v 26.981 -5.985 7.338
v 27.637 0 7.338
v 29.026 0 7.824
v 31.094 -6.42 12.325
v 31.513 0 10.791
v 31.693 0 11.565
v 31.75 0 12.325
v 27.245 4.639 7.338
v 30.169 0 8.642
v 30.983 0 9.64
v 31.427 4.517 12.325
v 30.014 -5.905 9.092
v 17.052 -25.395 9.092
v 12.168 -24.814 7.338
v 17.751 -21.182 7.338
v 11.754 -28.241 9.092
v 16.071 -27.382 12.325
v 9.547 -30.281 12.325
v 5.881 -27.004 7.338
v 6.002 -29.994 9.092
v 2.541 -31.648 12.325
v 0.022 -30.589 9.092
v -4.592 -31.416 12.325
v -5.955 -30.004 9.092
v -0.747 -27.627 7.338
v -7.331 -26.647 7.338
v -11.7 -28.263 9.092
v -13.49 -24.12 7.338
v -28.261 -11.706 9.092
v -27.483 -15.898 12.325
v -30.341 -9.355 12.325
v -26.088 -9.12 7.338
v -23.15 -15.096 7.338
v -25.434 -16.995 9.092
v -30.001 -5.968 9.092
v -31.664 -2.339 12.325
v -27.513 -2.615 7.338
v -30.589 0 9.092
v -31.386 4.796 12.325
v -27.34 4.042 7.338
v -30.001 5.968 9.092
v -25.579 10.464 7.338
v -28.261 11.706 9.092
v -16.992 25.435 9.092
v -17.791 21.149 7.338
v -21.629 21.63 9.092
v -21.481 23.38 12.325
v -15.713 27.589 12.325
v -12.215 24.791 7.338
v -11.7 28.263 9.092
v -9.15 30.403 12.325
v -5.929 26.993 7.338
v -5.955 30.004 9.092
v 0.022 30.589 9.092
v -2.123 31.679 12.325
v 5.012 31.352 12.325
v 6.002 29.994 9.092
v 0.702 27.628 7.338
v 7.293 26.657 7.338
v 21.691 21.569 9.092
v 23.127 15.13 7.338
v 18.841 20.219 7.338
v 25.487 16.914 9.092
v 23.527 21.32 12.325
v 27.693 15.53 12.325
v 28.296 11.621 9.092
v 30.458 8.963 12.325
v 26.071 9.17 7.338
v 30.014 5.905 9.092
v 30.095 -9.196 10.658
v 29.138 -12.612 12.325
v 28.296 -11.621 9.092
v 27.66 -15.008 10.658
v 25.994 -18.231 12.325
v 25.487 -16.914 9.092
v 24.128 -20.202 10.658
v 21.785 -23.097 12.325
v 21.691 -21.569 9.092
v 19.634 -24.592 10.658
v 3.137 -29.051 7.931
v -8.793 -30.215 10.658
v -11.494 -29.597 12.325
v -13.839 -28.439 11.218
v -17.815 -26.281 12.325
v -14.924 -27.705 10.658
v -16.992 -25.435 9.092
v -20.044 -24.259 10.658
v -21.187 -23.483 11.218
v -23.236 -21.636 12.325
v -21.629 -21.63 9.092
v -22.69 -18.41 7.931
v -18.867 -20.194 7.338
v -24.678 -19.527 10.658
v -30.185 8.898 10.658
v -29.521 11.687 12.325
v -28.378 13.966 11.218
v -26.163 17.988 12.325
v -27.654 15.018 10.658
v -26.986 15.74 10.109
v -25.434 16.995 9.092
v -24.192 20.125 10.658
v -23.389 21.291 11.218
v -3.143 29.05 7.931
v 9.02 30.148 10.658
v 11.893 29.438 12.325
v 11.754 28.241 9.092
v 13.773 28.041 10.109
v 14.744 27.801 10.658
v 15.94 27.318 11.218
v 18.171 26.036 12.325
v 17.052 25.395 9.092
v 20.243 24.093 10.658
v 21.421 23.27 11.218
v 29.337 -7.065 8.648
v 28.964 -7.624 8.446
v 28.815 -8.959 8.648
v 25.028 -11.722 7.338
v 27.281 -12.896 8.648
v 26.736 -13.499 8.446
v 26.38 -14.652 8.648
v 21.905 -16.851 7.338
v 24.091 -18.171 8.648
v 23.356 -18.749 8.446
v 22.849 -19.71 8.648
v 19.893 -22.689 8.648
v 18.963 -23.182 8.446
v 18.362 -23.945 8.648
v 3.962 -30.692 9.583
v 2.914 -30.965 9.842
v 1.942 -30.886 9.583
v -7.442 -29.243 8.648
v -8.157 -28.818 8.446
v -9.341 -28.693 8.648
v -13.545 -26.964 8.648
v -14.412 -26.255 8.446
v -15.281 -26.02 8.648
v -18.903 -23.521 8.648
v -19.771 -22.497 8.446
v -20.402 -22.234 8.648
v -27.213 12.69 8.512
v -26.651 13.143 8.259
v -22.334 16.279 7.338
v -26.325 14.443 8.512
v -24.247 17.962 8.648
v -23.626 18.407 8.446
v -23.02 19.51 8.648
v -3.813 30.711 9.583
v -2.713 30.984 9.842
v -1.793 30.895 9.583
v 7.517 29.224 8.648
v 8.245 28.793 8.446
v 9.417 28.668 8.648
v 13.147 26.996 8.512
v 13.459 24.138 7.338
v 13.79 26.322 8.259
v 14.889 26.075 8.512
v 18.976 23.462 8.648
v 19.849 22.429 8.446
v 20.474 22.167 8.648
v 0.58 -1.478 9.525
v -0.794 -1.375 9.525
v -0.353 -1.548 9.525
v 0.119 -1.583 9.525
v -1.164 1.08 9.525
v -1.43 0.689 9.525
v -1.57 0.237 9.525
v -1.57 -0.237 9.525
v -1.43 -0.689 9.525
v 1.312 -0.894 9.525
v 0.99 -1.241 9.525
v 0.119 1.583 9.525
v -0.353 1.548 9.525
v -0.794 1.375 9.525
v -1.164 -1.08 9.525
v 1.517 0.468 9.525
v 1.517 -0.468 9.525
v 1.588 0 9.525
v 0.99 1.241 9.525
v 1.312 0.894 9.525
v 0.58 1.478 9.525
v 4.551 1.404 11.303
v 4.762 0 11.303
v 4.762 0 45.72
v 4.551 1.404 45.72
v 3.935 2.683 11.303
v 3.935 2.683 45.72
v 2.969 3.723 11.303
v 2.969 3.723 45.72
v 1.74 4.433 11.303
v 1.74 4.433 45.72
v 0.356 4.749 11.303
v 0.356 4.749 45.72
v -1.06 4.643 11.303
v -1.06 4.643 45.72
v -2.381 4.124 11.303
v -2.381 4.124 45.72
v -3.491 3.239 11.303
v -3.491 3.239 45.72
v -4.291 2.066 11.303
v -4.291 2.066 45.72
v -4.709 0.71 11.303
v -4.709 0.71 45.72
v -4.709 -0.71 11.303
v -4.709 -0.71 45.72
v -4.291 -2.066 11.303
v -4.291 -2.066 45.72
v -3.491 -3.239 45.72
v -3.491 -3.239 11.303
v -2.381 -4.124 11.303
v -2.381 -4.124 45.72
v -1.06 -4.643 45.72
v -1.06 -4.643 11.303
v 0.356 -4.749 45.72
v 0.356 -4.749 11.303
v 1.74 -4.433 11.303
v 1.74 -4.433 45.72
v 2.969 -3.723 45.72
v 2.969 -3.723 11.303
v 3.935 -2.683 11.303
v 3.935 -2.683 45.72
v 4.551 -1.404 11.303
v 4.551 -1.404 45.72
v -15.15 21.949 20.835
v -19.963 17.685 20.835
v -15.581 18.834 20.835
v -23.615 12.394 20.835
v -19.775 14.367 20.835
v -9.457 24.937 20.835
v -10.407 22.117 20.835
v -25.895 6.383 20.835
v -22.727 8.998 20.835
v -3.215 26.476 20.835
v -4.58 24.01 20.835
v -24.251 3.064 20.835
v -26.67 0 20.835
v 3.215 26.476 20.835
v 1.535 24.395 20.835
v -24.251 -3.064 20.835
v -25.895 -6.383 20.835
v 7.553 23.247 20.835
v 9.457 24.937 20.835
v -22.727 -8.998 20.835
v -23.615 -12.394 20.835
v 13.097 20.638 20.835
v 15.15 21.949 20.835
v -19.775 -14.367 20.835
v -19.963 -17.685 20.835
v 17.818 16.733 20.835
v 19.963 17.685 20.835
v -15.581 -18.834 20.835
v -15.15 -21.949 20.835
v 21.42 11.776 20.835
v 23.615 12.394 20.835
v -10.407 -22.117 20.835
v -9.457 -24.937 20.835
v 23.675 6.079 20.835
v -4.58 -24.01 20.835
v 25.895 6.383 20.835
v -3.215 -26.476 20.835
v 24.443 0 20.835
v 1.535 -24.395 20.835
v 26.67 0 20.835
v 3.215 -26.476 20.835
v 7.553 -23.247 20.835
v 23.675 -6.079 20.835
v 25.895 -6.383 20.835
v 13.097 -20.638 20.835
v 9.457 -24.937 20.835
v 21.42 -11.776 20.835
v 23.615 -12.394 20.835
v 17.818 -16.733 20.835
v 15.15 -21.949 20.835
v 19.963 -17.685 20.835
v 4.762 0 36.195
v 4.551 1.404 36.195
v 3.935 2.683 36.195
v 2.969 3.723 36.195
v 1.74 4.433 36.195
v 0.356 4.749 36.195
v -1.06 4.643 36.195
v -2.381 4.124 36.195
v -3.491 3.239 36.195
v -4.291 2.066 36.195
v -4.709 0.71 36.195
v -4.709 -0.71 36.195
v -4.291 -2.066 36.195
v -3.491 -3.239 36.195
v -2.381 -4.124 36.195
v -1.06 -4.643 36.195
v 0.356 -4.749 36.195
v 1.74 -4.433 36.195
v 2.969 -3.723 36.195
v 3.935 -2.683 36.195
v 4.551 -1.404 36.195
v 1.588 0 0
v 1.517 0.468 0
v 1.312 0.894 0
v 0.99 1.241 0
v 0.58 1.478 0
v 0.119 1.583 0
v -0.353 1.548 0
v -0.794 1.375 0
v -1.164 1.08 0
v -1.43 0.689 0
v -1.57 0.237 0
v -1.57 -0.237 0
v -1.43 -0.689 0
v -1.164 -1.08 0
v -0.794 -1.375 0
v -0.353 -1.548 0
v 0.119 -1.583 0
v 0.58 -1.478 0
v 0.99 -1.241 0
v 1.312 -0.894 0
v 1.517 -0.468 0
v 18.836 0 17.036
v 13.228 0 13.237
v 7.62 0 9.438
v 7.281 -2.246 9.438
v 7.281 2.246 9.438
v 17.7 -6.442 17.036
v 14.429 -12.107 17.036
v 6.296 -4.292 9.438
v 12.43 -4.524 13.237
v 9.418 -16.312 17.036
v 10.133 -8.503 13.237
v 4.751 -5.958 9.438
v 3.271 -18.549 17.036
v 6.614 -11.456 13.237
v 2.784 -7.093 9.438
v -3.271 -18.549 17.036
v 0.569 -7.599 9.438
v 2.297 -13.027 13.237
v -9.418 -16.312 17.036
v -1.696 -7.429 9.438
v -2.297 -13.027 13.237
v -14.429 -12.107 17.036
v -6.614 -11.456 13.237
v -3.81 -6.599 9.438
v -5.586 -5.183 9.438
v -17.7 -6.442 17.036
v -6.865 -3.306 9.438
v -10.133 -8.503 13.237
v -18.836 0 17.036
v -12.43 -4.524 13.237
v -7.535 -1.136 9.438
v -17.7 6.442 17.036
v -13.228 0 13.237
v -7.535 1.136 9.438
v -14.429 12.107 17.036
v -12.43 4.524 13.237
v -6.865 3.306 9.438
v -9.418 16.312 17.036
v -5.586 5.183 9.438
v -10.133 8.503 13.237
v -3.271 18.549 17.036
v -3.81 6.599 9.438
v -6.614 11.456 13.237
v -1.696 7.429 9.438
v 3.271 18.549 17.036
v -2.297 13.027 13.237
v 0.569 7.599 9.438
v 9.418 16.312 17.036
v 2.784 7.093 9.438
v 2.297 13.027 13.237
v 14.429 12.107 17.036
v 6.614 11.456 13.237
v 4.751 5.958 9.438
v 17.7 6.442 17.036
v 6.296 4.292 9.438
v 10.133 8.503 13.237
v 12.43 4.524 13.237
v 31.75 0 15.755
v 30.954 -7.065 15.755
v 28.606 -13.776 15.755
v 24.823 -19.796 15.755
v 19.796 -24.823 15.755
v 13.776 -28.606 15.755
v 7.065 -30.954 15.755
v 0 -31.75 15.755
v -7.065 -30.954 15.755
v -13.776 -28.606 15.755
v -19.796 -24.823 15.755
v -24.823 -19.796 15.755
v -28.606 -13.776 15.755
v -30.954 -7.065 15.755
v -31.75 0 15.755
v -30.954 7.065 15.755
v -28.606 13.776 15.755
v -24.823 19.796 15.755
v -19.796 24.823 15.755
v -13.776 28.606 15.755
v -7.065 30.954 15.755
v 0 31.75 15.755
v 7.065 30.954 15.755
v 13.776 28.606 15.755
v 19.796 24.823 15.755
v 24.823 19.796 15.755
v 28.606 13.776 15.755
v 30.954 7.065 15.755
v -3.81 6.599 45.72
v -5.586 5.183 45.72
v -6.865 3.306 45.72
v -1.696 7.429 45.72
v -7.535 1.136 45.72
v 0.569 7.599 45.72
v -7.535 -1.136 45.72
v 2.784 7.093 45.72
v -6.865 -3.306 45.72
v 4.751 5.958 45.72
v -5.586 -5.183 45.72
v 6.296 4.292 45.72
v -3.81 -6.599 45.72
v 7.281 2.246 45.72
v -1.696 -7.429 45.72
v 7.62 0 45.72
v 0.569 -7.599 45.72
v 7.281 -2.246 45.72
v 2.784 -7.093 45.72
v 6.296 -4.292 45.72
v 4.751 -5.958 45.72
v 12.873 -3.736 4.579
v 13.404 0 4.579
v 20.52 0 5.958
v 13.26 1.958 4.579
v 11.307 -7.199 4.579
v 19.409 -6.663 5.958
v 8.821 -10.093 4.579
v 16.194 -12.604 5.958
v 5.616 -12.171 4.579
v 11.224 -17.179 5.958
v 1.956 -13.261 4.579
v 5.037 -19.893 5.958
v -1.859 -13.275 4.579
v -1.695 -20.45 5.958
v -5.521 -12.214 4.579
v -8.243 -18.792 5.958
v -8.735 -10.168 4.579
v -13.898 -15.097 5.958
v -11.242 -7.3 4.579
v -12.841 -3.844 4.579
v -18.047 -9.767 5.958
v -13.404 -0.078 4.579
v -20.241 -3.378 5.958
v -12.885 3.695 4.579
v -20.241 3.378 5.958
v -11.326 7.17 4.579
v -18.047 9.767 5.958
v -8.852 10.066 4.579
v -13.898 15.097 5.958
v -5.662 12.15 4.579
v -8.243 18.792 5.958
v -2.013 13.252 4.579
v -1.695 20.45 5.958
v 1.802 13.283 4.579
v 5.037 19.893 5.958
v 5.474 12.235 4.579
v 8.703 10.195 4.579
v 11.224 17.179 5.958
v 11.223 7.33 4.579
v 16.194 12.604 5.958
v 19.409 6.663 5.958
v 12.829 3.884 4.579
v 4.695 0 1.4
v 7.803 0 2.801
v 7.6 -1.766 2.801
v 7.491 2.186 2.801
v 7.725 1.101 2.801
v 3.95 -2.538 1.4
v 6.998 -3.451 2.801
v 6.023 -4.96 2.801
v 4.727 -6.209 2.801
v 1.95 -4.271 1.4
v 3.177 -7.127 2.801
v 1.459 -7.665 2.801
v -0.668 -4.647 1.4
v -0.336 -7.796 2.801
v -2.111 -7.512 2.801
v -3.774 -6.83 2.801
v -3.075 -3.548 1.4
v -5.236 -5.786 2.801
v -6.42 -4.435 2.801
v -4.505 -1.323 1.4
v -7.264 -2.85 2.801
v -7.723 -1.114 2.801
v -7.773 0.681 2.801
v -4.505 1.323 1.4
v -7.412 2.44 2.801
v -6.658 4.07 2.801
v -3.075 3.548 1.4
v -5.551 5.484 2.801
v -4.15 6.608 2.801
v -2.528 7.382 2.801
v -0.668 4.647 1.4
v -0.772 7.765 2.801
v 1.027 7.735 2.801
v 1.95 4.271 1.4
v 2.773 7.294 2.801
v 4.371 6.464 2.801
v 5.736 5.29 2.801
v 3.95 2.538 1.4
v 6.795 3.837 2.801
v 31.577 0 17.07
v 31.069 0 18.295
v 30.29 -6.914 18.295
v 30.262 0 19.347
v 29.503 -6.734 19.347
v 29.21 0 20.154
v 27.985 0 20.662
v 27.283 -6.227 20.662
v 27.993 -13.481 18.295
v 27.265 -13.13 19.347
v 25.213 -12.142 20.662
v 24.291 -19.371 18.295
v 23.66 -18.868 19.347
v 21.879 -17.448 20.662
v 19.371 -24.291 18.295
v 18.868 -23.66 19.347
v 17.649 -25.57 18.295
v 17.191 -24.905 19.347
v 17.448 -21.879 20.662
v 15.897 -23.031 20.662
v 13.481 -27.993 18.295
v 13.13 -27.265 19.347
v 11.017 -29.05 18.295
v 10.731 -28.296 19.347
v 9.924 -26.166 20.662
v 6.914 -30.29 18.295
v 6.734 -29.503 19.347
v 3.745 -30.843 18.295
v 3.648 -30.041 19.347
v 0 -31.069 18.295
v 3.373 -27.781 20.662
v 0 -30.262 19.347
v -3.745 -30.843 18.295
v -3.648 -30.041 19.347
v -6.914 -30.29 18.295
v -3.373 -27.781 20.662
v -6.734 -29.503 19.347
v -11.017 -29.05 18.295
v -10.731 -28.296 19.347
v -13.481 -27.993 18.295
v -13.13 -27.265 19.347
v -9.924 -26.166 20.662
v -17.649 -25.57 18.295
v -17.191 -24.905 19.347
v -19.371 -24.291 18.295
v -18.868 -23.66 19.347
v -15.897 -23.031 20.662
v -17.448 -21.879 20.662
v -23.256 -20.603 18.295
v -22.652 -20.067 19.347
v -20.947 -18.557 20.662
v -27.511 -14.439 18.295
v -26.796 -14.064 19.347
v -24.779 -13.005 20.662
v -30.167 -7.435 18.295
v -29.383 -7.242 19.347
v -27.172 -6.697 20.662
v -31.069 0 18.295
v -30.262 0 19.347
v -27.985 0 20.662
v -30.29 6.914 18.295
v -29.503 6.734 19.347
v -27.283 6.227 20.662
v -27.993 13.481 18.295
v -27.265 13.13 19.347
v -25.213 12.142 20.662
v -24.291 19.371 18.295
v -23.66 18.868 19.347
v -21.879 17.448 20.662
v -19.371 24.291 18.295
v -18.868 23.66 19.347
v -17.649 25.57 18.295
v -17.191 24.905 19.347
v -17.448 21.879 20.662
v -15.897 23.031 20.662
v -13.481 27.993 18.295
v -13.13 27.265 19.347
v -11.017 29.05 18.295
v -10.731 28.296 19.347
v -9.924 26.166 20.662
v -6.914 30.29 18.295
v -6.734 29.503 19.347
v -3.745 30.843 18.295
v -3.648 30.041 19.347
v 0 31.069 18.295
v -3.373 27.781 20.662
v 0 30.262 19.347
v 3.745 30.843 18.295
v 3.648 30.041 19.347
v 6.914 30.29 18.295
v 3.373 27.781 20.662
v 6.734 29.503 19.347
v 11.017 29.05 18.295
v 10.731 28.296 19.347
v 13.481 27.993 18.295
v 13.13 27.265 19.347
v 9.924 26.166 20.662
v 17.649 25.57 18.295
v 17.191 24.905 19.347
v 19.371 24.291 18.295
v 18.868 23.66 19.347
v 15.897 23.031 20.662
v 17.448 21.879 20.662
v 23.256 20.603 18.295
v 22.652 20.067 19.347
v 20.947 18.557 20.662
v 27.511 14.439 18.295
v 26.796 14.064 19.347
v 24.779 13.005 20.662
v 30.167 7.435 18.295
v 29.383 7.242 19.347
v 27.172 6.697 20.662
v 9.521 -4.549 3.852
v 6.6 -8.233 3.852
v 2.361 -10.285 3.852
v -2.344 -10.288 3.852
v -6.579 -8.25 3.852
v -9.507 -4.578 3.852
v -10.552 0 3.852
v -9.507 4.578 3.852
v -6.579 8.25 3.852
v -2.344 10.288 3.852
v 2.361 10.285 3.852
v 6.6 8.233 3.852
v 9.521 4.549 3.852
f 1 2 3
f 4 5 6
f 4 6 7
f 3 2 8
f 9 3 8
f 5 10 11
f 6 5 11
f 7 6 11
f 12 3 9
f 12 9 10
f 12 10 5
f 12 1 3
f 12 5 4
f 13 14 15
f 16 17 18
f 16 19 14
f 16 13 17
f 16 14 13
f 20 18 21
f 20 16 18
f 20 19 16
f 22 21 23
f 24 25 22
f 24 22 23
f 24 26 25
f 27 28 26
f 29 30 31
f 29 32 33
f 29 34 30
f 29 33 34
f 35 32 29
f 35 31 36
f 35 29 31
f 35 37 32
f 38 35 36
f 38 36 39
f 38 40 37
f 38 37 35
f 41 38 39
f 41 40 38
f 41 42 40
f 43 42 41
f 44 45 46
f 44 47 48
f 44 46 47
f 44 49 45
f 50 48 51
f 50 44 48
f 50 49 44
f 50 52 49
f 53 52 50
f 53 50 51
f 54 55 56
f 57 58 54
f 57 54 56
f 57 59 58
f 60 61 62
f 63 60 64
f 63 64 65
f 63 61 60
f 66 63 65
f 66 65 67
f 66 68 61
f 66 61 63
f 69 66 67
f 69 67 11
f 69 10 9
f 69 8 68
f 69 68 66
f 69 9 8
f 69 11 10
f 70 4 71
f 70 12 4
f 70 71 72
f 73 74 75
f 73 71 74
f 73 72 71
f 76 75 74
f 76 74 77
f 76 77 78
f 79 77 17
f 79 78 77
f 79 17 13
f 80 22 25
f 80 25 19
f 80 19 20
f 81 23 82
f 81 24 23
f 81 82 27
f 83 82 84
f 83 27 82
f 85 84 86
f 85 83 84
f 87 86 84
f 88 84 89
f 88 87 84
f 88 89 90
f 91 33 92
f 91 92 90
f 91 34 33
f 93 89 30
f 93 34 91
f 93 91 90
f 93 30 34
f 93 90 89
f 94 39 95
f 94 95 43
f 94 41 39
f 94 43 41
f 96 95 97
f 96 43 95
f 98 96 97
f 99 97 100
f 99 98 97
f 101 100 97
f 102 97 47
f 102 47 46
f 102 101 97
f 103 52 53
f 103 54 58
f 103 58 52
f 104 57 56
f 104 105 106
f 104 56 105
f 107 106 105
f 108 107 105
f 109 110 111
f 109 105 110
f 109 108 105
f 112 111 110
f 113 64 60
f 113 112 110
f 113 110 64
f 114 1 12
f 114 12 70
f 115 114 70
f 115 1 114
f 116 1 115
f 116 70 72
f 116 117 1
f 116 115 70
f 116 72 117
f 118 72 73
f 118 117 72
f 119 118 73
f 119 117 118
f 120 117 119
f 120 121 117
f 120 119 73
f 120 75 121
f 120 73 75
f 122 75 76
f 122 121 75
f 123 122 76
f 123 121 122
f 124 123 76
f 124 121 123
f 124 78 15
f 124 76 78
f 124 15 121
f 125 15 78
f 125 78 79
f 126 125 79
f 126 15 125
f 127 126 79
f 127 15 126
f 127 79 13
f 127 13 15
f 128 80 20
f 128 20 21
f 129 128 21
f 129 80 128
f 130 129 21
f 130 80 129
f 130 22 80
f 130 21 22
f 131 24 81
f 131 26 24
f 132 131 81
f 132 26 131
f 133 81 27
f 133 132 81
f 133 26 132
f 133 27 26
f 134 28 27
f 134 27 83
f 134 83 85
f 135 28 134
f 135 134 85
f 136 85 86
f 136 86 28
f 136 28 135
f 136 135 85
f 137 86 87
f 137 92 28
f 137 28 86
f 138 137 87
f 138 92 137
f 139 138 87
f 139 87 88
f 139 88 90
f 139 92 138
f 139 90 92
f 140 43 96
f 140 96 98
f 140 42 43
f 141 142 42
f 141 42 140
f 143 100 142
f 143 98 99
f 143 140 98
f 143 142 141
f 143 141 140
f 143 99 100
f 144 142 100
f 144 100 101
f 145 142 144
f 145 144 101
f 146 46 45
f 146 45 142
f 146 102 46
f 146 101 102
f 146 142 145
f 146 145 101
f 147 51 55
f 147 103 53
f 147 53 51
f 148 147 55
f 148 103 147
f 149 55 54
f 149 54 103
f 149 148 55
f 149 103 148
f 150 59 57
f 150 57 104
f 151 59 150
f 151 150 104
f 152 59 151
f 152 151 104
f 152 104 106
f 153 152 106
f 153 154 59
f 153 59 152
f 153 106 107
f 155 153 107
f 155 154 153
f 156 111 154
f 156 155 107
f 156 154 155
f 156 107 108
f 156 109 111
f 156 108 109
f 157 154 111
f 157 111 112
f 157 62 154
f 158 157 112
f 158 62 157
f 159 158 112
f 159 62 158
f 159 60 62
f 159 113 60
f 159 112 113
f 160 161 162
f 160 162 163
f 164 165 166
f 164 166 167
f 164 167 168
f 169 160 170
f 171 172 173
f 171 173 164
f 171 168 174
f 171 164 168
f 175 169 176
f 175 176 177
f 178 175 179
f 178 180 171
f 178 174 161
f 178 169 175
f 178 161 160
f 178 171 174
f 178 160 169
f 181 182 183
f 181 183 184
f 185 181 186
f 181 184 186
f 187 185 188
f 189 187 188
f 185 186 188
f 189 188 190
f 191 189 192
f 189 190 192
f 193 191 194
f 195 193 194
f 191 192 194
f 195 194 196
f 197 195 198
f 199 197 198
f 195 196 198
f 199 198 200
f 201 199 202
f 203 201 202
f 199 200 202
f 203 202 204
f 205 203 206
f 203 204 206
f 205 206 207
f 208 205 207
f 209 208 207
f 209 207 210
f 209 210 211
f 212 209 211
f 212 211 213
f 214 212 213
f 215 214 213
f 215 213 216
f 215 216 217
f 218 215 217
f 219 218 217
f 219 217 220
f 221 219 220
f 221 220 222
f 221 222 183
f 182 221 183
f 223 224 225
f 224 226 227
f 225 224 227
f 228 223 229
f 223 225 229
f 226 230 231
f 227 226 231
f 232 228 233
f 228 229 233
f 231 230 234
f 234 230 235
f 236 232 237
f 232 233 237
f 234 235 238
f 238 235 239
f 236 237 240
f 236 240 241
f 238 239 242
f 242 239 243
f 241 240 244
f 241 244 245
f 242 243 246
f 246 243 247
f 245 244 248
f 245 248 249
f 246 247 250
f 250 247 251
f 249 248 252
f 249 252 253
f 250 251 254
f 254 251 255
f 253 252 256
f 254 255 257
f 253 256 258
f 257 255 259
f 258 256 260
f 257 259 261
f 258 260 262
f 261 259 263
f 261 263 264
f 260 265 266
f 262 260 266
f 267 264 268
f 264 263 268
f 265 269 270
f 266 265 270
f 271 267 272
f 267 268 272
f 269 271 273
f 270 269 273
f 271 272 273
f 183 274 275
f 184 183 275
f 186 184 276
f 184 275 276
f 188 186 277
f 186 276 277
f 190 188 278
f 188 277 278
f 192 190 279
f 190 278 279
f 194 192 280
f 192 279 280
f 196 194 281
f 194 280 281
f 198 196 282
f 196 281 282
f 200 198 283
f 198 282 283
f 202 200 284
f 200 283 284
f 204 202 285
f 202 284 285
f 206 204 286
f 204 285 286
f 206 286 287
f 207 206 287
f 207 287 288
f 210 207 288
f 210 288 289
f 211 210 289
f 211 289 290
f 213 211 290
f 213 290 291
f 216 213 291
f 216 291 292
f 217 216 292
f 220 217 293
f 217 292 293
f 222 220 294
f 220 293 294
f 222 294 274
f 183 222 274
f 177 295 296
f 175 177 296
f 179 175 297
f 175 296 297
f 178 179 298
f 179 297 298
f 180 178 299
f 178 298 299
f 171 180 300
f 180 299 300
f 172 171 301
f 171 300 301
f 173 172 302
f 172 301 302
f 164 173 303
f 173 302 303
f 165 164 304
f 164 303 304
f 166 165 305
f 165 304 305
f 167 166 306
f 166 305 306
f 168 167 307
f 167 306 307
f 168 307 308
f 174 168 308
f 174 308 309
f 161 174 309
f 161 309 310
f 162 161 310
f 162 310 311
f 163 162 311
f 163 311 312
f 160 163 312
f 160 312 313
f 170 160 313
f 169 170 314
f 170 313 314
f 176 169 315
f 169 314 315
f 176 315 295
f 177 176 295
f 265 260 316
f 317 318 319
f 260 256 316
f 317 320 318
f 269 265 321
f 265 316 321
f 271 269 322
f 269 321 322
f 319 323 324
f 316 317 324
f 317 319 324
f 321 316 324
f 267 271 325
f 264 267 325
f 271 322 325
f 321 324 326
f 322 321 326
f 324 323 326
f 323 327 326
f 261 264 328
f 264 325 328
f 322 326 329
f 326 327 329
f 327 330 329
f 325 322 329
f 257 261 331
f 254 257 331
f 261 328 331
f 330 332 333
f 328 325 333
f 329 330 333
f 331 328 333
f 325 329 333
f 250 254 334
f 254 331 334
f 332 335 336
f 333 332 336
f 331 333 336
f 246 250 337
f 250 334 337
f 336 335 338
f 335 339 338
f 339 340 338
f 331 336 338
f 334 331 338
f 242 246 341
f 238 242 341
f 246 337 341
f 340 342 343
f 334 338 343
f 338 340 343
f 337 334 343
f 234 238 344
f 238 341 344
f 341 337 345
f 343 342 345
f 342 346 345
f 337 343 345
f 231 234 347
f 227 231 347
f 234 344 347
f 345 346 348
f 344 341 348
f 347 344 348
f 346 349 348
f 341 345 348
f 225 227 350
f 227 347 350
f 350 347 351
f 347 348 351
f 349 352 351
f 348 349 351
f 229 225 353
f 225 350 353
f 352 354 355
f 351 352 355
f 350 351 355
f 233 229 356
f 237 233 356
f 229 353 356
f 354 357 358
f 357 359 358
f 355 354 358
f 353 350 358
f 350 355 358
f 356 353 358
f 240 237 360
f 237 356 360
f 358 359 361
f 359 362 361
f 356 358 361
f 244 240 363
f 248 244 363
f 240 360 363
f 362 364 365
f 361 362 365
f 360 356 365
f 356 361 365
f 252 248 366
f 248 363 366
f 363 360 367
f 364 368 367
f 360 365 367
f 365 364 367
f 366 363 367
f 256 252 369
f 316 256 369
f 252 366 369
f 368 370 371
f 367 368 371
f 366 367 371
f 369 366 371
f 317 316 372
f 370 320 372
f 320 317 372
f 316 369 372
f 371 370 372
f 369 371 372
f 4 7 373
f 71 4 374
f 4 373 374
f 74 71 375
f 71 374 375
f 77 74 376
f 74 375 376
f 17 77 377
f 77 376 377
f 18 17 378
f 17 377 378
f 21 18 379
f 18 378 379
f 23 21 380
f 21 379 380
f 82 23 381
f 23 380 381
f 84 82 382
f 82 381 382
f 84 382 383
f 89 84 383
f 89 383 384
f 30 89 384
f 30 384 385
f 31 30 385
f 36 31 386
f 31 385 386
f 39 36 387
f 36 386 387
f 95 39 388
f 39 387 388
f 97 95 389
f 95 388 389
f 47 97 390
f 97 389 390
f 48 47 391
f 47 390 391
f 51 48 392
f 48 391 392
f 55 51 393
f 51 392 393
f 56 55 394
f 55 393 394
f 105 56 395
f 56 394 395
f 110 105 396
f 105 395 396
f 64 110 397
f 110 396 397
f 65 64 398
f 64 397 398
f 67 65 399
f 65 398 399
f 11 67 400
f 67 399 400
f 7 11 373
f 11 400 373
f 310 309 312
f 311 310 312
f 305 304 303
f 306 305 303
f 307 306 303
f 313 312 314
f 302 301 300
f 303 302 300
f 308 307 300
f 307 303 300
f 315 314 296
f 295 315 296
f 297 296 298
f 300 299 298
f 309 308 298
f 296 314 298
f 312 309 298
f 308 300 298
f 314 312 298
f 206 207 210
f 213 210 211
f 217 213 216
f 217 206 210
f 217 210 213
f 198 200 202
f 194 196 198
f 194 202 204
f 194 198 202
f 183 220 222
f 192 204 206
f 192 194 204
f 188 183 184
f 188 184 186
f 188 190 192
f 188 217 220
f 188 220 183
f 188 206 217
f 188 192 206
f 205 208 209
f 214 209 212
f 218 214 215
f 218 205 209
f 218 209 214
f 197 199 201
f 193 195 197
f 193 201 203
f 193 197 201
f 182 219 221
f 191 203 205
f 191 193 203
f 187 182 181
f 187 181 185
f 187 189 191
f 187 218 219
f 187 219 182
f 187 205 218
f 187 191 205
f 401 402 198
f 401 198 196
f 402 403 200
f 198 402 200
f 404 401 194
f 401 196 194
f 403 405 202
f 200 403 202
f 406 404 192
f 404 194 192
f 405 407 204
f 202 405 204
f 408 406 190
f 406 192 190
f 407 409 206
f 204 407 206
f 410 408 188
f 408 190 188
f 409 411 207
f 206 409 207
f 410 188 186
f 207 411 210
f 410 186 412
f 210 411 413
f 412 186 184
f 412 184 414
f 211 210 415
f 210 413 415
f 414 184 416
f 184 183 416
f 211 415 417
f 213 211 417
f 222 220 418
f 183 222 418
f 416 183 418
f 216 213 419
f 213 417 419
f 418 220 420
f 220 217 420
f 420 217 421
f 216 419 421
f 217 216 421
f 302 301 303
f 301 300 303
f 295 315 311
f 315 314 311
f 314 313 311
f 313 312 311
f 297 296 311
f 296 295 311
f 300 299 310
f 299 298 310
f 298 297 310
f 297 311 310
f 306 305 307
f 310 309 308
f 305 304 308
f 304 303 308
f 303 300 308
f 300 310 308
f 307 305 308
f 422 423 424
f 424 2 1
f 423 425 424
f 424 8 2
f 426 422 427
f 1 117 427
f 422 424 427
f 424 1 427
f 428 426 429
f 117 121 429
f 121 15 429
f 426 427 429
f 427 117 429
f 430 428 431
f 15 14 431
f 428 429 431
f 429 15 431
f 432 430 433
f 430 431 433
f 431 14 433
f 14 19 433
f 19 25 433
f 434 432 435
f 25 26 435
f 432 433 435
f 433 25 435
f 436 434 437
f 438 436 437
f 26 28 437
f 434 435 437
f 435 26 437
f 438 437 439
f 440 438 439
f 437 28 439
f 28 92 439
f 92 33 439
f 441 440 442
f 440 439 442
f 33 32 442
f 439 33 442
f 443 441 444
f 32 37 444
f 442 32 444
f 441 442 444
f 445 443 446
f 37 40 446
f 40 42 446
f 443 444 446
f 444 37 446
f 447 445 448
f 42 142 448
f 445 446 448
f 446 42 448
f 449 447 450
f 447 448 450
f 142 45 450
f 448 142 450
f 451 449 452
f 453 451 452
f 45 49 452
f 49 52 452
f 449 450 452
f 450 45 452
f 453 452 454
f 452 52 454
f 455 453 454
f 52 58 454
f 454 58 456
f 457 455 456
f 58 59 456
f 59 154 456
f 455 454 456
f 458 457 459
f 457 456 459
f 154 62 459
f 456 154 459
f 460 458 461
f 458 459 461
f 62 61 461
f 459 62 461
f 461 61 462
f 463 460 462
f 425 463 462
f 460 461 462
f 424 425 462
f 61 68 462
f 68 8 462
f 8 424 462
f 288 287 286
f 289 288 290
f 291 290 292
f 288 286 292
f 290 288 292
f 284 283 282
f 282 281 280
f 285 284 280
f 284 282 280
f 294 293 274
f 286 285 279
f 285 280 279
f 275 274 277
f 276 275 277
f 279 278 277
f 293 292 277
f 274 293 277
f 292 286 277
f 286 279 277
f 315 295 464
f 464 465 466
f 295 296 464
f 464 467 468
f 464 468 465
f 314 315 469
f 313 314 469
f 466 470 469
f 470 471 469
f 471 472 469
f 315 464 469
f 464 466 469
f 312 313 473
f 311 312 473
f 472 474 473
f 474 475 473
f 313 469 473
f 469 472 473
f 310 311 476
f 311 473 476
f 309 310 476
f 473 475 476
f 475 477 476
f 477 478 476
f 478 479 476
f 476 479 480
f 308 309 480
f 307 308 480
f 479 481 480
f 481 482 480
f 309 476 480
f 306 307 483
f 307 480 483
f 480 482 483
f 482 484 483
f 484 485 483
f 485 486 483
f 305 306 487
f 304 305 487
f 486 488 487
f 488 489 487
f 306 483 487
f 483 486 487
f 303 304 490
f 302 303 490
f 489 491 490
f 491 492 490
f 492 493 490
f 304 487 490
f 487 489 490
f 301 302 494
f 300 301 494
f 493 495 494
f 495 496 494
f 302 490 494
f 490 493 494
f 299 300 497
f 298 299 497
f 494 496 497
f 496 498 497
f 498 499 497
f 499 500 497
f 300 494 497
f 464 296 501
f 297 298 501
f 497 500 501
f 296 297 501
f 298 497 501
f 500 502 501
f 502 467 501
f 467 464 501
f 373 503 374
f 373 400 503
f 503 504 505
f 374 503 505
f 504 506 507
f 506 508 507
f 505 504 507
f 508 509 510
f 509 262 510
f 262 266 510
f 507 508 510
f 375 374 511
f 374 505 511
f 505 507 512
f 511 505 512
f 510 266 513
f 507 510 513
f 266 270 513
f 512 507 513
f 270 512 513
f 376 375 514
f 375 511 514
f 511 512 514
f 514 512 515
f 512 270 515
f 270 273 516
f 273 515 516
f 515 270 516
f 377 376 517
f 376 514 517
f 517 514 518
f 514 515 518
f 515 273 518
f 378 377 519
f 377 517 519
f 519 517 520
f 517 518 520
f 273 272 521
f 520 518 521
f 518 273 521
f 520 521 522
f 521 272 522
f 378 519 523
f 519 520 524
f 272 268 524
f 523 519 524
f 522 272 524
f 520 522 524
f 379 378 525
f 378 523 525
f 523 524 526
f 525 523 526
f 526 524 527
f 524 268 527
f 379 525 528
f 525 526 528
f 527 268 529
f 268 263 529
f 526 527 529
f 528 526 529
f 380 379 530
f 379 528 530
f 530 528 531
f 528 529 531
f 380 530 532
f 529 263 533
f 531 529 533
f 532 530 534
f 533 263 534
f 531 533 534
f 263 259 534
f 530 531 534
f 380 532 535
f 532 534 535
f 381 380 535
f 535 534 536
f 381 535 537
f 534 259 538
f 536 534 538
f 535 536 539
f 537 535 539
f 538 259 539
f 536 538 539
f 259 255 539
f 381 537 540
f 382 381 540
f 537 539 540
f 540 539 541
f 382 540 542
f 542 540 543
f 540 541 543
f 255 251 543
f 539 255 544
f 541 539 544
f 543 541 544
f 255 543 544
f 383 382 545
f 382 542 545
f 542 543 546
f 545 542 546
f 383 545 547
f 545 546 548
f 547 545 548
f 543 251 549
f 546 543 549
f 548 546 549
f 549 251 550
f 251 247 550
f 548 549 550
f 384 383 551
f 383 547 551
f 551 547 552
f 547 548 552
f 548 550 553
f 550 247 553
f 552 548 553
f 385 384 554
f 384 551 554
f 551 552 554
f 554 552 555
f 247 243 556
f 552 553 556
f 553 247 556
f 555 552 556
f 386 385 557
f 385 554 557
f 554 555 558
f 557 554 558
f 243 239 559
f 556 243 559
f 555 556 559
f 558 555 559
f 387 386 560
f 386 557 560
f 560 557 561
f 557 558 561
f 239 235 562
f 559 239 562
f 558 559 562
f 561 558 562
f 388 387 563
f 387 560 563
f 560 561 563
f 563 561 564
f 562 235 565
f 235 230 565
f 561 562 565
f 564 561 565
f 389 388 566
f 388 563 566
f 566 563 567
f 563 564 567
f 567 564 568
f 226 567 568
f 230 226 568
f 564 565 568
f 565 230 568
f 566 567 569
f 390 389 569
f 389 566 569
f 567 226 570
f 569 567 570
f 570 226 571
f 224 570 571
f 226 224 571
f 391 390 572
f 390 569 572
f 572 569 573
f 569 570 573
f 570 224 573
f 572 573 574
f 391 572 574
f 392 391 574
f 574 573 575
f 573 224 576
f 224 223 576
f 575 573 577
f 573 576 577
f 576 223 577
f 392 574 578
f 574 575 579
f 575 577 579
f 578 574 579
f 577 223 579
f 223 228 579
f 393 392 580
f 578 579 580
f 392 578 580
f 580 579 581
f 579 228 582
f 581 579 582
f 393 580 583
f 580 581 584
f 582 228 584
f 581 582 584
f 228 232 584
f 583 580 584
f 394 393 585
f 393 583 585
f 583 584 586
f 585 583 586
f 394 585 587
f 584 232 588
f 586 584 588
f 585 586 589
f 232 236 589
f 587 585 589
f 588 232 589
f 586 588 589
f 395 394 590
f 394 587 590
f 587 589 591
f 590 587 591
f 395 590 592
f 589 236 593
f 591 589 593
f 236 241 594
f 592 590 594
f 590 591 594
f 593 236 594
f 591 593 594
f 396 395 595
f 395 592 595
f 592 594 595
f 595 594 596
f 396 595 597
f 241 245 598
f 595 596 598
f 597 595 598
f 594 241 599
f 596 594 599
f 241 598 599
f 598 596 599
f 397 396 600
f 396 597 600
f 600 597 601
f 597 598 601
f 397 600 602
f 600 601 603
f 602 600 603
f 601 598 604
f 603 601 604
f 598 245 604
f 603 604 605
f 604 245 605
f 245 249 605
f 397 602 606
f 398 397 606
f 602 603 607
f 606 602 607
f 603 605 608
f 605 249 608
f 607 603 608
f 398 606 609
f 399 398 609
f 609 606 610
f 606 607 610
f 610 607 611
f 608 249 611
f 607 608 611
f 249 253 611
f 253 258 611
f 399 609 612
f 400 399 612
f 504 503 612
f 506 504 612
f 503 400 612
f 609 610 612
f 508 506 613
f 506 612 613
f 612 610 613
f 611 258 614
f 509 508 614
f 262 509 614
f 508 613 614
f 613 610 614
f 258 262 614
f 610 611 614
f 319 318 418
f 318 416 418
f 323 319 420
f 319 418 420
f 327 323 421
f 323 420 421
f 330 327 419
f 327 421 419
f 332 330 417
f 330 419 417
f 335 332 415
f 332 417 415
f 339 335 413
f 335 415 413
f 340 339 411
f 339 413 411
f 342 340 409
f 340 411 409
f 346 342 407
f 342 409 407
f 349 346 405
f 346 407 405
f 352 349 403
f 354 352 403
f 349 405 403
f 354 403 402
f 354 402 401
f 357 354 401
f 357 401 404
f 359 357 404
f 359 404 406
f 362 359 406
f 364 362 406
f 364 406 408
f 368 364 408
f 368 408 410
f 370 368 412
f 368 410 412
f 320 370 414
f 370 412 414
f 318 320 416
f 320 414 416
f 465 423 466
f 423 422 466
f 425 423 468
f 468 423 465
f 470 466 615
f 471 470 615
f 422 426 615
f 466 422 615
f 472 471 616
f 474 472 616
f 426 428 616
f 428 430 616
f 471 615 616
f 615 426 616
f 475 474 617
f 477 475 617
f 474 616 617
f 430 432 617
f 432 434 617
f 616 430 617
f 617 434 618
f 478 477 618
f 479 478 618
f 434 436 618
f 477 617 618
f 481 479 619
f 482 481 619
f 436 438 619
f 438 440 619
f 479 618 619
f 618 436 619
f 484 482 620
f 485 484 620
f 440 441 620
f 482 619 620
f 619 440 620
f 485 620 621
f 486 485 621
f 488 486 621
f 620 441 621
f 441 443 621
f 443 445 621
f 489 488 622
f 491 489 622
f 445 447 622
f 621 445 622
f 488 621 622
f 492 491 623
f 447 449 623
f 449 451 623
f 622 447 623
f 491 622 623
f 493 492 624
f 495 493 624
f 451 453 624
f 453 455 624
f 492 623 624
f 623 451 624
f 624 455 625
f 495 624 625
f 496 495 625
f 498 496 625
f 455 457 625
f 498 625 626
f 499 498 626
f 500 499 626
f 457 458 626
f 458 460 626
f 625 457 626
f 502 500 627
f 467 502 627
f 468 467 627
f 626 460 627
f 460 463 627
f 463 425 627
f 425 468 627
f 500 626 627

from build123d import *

# Parameters (mm, degrees)
F2_R      = 5.08
F3_R      = 25.4
F4_R      = 4.7625
F5_DEPTH  = 9.525
F6_R      = 1.5875
F7_DEPTH  = 9.525
F5_FACE_R = 4.7625
F8_DEPTH  = 9.525
F9_DEPTH  = 24.892


with BuildPart() as f1:
    # F0 (on Front) → F1 (revolve)
    with BuildSketch(Plane.XZ):
        Polygon((10.500061, 4.015946), (31.75, 8.134865), (31.75, 20.834865), (24.443309, 20.834865), (7.62, 9.438433), (7.62, 45.72), (0, 45.72), (0, 0), (1.5875, 0), align=None)
    revolve(axis=Axis((0, 0, 22.86), (0, 0, -1)))

    # F2
    f2_edges = [f1.edges().sort_by_distance(p)[0] for p in [
        (-31.75, 0, 8.134865),
        (-31.75, 0, 20.834865),
        (31.75, 0, 14.484865),
    ]]
    fillet(f2_edges, radius=F2_R)

    # F3
    f3_edges = [f1.edges().sort_by_distance(p)[0] for p in [
        (-10.500061, 0, 4.015946),
    ]]
    fillet(f3_edges, radius=F3_R)

    # F4 (on face) → F5 (cut)
    with BuildSketch(Plane.XY.offset(45.72)):
        Circle(F4_R)
    extrude(amount=-F5_DEPTH, mode=Mode.SUBTRACT)

    # F5_face (on face) → F9 (cut)
    with BuildSketch(Plane.XY.offset(36.195)):
        Circle(F5_FACE_R)
    extrude(amount=-F9_DEPTH, mode=Mode.SUBTRACT)


with BuildPart() as f7:
    # F6 (on Top) → F7 (new body)
    with BuildSketch(Plane.XY):
        Circle(F6_R)
    extrude(amount=F7_DEPTH)


with BuildPart() as f8:
    # F5_face (on face) → F8 (new body)
    with BuildSketch(Plane.XY.offset(36.195)):
        Circle(F5_FACE_R)
    extrude(amount=F8_DEPTH)


solid = Compound([f1.part, f7.part, f8.part])
